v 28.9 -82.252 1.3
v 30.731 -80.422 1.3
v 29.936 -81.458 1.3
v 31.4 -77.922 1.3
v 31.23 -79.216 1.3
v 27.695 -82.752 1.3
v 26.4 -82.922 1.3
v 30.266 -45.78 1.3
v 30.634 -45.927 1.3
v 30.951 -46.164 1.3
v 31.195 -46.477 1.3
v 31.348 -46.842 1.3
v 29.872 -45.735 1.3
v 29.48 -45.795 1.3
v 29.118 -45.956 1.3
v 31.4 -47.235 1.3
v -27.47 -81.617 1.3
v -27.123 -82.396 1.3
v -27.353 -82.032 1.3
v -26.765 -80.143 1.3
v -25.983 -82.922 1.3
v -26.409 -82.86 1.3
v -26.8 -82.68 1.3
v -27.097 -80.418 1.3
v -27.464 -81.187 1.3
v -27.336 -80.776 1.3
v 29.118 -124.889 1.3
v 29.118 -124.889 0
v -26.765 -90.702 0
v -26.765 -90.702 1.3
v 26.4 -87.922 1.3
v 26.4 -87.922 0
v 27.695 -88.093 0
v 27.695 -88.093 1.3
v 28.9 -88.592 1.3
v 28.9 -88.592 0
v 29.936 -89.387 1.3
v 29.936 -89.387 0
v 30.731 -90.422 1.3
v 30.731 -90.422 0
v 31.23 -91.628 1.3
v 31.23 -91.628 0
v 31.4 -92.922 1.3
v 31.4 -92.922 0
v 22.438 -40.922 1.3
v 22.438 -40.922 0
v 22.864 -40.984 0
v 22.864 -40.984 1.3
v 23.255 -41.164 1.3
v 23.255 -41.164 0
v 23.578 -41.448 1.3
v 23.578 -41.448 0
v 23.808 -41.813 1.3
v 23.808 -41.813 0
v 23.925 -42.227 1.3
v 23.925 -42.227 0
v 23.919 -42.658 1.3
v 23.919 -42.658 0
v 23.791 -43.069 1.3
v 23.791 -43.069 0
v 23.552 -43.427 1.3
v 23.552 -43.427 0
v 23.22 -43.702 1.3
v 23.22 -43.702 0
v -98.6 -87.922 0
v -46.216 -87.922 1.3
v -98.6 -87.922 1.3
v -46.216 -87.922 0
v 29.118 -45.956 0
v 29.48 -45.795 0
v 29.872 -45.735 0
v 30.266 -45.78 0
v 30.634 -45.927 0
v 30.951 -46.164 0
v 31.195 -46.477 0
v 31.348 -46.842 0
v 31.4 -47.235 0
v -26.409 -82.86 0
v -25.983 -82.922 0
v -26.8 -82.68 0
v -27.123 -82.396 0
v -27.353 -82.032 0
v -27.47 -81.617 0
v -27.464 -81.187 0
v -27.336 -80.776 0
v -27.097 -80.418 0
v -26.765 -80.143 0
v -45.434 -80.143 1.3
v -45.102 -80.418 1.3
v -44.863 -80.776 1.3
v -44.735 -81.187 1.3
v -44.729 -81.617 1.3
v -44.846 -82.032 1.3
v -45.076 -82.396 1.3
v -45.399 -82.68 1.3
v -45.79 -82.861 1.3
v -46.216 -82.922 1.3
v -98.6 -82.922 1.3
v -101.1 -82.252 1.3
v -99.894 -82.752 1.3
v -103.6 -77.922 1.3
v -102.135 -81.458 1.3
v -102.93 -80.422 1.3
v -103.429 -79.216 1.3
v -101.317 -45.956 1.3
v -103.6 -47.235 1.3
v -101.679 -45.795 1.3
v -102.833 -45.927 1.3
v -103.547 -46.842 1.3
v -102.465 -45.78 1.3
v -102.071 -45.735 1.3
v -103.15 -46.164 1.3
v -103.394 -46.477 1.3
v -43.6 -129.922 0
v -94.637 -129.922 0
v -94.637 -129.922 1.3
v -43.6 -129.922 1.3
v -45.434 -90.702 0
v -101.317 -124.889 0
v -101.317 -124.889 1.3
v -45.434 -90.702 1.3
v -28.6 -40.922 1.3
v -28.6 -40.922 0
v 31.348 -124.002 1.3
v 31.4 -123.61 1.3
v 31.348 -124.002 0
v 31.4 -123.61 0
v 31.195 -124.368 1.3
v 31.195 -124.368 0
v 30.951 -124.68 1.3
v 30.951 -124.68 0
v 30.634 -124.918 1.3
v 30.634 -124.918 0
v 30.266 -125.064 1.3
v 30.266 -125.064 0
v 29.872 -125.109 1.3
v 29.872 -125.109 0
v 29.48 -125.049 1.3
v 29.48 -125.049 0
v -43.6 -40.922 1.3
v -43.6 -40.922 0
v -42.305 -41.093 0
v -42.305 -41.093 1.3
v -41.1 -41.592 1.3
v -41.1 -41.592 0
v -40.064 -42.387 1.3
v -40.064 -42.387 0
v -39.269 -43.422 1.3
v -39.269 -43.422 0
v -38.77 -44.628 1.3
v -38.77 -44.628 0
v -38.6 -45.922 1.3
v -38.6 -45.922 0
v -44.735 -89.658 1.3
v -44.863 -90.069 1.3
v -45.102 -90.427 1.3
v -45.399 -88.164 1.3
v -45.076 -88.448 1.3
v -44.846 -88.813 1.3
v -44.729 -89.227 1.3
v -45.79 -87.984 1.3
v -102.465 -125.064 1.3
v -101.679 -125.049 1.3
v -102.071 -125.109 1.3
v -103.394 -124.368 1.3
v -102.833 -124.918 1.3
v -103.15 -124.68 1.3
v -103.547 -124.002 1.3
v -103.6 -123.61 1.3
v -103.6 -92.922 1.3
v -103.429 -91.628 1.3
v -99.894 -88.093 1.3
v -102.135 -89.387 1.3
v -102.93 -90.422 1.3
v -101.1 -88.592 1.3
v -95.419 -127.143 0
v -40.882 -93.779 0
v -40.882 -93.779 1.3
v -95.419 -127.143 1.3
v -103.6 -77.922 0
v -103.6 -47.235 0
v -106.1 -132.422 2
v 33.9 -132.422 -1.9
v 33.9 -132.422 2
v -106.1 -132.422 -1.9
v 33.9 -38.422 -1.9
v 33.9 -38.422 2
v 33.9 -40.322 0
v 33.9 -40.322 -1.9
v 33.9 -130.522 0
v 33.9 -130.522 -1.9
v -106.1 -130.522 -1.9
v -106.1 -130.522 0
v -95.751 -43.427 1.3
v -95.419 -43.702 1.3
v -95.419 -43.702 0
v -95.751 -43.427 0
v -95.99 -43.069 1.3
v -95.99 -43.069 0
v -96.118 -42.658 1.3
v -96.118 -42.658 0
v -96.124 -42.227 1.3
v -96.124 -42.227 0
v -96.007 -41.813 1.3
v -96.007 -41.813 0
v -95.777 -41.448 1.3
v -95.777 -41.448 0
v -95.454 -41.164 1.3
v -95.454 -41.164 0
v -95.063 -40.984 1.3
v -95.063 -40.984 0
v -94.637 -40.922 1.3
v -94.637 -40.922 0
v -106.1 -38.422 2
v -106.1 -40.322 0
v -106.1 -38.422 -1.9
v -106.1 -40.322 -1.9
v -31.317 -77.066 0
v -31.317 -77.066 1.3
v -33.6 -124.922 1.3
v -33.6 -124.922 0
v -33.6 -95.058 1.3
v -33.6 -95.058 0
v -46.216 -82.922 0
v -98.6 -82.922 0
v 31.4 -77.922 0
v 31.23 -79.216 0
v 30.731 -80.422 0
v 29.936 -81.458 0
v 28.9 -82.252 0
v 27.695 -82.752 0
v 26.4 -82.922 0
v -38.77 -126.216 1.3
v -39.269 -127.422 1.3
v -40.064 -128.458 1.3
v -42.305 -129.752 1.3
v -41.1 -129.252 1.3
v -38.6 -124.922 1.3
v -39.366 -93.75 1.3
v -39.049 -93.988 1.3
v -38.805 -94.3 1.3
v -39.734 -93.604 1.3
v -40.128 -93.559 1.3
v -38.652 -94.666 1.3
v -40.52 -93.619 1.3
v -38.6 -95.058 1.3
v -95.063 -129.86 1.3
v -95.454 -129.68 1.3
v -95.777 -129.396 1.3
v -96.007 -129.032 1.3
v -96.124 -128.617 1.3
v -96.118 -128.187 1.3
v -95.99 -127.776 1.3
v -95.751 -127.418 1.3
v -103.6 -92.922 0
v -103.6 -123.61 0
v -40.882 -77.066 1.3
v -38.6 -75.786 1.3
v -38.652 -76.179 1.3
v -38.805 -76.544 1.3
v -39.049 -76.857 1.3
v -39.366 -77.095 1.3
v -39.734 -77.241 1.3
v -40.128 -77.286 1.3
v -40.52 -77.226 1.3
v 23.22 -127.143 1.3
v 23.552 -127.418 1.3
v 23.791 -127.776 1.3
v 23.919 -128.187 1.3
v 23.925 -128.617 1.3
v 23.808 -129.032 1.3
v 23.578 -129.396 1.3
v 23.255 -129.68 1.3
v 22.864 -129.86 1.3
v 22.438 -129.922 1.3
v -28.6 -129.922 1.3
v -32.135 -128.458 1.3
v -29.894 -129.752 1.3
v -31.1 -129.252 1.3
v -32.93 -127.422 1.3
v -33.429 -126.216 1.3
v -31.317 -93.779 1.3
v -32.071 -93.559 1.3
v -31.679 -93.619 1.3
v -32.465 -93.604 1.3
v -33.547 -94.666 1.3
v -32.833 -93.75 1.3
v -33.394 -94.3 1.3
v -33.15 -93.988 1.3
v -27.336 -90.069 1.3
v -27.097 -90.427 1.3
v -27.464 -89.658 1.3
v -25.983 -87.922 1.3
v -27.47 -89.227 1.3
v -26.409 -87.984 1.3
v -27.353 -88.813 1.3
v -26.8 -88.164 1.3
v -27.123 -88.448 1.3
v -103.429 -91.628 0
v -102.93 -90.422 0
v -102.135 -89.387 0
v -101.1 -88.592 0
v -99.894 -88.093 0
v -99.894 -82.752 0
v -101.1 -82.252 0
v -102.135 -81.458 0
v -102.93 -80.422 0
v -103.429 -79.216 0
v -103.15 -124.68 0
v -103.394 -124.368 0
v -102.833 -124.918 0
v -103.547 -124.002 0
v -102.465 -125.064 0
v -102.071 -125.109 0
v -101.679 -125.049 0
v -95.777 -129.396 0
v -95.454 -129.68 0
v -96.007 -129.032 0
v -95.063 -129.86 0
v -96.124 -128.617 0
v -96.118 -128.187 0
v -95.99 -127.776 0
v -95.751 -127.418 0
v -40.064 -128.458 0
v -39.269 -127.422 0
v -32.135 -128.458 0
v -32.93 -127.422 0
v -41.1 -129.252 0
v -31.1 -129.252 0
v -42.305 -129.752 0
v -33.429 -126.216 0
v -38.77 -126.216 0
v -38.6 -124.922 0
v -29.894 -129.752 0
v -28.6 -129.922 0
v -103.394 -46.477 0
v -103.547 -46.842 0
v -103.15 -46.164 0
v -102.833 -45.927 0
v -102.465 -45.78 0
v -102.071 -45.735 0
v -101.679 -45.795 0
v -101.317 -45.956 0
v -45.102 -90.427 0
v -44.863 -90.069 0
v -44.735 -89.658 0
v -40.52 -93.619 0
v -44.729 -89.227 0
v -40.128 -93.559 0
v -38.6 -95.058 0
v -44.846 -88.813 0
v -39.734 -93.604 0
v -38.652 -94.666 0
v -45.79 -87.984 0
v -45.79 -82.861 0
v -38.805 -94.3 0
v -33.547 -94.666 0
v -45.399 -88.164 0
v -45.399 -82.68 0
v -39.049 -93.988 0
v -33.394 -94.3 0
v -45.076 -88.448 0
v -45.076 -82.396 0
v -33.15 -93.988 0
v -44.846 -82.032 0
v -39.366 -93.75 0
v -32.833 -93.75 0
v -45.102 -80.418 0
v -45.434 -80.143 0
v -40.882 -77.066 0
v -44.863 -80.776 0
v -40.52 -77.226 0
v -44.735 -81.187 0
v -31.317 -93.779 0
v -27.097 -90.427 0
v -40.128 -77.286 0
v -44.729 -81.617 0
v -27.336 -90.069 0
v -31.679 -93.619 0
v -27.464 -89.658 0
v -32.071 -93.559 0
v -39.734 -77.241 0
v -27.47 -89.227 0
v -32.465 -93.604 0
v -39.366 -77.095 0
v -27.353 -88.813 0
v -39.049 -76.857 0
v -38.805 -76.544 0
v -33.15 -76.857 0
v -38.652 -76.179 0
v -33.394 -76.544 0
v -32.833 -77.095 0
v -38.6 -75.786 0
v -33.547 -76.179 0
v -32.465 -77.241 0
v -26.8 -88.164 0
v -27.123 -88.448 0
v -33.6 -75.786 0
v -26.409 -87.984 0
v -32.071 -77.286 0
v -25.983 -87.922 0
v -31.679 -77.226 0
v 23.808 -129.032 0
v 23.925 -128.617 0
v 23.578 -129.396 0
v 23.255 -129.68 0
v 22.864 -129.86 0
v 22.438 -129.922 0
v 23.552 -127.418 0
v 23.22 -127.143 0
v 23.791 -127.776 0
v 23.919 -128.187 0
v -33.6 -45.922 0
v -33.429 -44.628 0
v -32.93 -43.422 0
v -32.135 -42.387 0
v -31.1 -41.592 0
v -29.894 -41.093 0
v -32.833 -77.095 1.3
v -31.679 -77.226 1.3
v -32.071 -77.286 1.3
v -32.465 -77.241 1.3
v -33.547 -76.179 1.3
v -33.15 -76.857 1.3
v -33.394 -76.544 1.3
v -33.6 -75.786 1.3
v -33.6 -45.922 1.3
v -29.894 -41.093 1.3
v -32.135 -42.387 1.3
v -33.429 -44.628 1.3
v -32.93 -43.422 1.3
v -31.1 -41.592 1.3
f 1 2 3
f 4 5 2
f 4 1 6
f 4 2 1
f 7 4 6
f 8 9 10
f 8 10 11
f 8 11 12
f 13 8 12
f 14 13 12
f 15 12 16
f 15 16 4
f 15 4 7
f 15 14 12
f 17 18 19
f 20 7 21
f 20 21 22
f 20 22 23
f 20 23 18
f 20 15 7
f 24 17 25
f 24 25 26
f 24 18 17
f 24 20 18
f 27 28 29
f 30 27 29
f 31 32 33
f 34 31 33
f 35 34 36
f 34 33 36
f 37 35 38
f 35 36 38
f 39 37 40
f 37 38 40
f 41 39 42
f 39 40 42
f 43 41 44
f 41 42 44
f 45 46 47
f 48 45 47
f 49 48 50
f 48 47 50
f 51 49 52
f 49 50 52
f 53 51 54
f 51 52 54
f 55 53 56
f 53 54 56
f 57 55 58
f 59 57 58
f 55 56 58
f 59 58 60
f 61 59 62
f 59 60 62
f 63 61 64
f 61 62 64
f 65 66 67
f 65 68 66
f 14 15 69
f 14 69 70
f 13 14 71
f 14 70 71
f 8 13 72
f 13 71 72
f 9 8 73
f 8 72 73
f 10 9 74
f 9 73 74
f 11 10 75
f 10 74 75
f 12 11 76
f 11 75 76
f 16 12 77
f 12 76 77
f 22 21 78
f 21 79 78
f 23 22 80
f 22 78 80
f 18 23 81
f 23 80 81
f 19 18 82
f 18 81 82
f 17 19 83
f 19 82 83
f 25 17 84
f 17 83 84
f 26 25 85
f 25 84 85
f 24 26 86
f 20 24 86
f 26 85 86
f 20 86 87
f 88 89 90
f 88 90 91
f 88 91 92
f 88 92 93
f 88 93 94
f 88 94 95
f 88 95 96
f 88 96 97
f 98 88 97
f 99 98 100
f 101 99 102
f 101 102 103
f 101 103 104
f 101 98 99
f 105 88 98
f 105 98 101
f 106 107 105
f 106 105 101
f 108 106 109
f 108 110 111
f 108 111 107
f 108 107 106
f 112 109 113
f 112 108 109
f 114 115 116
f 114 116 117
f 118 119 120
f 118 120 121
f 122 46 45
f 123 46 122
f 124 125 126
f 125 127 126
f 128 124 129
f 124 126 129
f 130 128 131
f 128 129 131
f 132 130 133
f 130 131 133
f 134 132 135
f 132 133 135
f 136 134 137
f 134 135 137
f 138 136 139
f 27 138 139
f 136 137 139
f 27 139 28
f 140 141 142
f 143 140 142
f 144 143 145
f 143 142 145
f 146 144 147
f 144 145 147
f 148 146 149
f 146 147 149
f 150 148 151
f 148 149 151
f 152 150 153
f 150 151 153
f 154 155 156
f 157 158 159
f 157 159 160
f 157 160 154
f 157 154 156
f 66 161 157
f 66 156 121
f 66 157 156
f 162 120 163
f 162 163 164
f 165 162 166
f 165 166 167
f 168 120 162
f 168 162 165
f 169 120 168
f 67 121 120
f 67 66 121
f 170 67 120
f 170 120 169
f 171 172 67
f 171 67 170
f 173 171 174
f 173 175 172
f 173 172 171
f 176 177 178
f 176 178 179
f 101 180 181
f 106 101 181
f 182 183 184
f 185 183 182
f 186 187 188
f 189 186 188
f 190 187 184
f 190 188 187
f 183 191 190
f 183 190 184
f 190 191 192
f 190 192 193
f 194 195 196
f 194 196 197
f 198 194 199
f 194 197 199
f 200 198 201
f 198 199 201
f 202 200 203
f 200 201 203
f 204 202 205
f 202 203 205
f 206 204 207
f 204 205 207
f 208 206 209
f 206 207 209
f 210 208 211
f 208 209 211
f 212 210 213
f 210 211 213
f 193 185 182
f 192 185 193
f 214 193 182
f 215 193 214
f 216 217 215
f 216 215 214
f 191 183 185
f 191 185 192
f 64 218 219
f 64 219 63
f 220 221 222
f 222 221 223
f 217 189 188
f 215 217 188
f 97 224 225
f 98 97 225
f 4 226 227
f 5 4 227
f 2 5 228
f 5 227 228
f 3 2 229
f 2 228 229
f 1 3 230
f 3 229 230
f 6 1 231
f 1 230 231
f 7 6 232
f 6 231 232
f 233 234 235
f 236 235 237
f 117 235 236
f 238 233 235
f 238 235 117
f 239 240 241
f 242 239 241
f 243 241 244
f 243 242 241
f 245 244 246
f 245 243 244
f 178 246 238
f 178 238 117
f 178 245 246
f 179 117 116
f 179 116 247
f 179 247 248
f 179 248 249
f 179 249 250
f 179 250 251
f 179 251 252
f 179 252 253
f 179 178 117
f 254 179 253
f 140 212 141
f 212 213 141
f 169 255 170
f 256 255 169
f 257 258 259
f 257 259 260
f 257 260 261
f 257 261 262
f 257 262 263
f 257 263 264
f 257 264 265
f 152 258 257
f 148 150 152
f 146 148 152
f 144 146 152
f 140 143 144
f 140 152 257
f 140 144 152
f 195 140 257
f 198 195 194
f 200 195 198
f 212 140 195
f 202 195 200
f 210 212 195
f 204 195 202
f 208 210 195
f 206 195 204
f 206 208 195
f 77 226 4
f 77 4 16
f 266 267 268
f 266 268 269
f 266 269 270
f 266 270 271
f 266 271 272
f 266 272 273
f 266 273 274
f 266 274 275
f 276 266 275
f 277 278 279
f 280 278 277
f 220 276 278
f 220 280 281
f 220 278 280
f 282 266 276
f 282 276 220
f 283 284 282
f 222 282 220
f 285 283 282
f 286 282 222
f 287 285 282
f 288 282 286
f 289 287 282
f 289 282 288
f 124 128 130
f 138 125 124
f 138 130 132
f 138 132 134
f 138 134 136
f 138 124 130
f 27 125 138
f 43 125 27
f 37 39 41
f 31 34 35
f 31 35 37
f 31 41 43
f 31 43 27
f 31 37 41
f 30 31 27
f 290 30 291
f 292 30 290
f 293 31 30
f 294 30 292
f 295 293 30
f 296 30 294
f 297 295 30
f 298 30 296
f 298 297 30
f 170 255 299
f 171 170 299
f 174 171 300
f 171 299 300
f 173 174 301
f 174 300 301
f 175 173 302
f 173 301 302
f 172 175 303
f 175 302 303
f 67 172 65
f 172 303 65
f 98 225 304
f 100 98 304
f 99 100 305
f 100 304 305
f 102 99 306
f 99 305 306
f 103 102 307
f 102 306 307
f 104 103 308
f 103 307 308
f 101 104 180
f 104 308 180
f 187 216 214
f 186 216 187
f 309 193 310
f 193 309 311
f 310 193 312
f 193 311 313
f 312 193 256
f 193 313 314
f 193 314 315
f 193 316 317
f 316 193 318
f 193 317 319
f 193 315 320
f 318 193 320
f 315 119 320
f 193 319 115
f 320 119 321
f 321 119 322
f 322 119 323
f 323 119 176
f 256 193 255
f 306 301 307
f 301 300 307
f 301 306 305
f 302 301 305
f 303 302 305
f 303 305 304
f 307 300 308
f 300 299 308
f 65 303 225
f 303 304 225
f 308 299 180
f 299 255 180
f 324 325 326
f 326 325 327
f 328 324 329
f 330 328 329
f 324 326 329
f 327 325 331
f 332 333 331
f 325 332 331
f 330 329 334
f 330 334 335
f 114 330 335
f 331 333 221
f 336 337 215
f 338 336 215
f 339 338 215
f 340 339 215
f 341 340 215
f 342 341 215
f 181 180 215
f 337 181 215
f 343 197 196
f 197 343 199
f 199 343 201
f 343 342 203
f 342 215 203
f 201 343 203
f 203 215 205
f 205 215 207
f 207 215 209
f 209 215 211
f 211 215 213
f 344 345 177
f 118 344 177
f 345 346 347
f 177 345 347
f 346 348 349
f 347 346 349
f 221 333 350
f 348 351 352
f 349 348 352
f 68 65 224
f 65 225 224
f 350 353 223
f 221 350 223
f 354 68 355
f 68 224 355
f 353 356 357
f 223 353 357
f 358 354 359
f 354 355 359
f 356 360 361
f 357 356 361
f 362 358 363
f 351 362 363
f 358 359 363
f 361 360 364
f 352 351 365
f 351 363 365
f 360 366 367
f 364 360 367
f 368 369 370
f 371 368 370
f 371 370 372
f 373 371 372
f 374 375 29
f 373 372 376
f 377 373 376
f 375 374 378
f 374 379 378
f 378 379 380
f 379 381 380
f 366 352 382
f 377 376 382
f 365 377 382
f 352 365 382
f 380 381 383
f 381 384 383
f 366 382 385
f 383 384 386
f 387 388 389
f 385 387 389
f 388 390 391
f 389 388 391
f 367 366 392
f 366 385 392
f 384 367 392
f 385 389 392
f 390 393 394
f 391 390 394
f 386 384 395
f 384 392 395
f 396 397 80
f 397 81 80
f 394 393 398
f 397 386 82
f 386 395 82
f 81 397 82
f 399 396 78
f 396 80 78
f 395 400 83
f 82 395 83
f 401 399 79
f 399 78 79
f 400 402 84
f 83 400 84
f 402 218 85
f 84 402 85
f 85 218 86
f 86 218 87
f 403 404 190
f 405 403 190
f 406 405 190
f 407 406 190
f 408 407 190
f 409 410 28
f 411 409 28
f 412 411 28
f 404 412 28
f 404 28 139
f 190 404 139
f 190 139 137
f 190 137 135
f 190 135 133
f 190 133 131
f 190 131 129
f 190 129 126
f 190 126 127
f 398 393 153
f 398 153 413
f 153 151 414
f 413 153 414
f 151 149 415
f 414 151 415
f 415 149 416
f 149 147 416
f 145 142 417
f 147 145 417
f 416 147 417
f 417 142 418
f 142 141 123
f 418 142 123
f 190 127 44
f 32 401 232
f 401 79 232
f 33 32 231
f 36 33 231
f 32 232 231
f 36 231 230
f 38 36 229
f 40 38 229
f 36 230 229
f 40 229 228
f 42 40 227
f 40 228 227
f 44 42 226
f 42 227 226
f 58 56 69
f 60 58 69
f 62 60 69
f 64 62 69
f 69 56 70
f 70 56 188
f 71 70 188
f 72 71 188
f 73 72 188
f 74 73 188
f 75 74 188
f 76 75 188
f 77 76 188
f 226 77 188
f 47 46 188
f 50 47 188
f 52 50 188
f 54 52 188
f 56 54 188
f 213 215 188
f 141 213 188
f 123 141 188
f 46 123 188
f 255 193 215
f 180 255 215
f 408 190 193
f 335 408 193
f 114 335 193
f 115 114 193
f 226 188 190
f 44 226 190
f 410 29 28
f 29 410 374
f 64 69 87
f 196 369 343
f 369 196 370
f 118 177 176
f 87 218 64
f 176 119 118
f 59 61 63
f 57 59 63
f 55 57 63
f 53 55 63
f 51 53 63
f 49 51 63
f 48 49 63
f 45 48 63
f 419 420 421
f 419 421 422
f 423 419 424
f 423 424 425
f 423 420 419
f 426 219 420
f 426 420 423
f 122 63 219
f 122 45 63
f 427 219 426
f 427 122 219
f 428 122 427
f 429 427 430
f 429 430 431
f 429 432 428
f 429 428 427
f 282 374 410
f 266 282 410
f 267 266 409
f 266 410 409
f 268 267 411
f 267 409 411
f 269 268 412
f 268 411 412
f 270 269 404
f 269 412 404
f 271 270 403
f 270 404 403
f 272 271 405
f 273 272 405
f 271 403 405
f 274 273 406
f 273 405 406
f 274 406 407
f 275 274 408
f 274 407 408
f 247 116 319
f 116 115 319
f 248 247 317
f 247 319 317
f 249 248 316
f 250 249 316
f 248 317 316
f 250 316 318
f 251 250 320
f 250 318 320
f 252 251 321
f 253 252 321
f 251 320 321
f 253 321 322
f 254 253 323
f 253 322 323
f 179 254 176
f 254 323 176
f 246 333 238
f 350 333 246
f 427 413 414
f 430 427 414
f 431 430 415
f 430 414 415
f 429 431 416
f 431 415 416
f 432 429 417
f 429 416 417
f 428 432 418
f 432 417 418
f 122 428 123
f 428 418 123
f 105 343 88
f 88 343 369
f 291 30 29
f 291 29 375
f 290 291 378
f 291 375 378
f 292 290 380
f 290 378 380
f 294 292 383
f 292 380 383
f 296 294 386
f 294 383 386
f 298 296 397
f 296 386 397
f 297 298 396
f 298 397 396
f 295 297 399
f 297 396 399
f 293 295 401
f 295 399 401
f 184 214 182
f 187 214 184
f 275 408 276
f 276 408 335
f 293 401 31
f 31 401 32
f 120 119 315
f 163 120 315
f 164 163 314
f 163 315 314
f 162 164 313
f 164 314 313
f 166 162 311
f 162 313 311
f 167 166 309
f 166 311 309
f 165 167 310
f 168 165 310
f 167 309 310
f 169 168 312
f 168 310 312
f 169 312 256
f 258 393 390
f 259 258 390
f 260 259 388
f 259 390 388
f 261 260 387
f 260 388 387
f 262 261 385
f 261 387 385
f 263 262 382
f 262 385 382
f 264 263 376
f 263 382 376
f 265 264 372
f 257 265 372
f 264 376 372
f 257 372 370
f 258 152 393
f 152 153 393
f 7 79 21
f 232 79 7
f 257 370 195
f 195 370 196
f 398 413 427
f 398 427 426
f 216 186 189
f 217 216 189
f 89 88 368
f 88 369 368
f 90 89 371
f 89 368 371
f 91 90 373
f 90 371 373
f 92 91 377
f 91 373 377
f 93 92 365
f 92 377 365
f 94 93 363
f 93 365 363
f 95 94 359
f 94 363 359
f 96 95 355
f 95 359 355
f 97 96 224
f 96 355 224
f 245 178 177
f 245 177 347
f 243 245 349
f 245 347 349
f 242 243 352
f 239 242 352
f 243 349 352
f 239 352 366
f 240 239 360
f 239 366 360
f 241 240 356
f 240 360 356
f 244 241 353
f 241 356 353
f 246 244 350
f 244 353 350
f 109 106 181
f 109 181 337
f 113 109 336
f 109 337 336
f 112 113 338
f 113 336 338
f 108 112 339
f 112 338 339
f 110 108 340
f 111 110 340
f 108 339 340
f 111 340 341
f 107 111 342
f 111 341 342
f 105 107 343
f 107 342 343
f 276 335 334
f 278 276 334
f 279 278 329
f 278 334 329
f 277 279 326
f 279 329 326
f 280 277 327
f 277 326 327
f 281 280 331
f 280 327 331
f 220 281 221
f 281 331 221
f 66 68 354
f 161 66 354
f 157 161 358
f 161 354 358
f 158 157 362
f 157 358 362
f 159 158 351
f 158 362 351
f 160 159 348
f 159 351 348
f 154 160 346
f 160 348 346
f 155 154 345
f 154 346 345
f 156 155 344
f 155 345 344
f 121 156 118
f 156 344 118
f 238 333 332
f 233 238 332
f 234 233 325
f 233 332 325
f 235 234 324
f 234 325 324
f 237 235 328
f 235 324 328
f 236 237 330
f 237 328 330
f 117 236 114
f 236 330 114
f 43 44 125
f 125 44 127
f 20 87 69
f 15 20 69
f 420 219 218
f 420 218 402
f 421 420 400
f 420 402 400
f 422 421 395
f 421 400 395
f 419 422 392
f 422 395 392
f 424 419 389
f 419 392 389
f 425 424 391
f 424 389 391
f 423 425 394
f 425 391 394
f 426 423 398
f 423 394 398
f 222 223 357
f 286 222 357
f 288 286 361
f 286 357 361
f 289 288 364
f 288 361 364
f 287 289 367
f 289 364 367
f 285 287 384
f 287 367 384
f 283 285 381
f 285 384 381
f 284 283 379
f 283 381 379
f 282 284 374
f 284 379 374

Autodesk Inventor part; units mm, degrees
ref_plane "YZ Plane" through (0, 0, 0) normal (1, 0, 0) x (0, 1, 0)
ref_plane "XZ Plane" through (0, 0, 0) normal (0, 1, 0) x (-1, 0, 0)
ref_plane "XY Plane" through (0, 0, 0) normal (0, 0, 1) x (1, 0, 0)
sketch "PanelBody" plane through (0, 0, 0) normal (0, 0, 1) x (1, 0, 0)
  line L0 (-106.0995, -38.4223) -> (33.9005, -38.4223)
  line L1 (33.9005, -38.4223) -> (33.9005, -132.4223)
  line L2 (33.9005, -132.4223) -> (-106.0995, -132.4223)
  line L3 (-106.0995, -132.4223) -> (-106.0995, -38.4223)
  dimension "d1" = 140
  dimension "d2" = 94
extrude "PanelFace" add sketch "PanelBody" along normal blind 2
sketch "SideHooks" plane through (-106.0995, -132.4223, 0) normal (-1, 0, 0) x (0, 0, 1)
  line L0 (0, 94) -> (-1.9, 94)
  line L1 (-1.9, 94) -> (-1.9, 92.1)
  line L2 (-1.9, 92.1) -> (0, 92.1)
  line L3 (0, 92.1) -> (0, 94)
  line L4 (0, 0) -> (-1.9, 0)
  line L5 (-1.9, 0) -> (-1.9, 1.9)
  line L6 (-1.9, 1.9) -> (0, 1.9)
  line L7 (0, 1.9) -> (0, 0)
  point P0 (0, 132.4223)
  dimension "d33" = 1.9
extrude "Corners" add sketch "SideHooks" against normal blind 140
sketch "Sketch3" plane through (33.9005, -38.4223, -1.9) normal (0, 0, -1) x (-1, 0, 0)
  line L0 (0, -94) -> (140, -94) construction
  line L1 (140, -94) -> (140, 0) construction
  line L2 (140, 0) -> (0, 0) construction
  line L3 (0, 0) -> (0, -94) construction
  line L4 (137.5, -91.5) -> (133.8633, -91.5) construction
  line L5 (72.5, -86.5) -> (72.5, -56.6362)
  line L6 (137.5, -54.5) -> (137.5, -85.1873)
  line L7 (137.5, -2.5) -> (133.8633, -2.5) construction
  line L8 (72.5, -7.5) -> (72.5, -37.3638)
  line L9 (137.5, -39.5) -> (137.5, -8.8127)
  line L10 (2.5, -2.5) -> (6.1367, -2.5) construction
  line L11 (67.5, -7.5) -> (67.5, -37.3638)
  line L12 (2.5, -39.5) -> (2.5, -8.8127)
  line L13 (2.5, -91.5) -> (6.1367, -91.5) construction
  line L14 (67.5, -86.5) -> (67.5, -56.6362)
  line L15 (2.5, -54.5) -> (2.5, -85.1873)
  line L16 (72.5, -2.5) -> (67.5, -2.5) construction
  line L17 (2.5, -44.5) -> (2.5, -49.5) construction
  line L18 (67.5, -91.5) -> (72.5, -91.5) construction
  line L19 (137.5, -44.5) -> (137.5, -49.5) construction
  line L20 (135.2172, -7.5332) -> (79.3341, -41.7204)
  line L21 (74.7828, -38.6434) -> (129.3198, -5.2796)
  line L22 (65.2172, -38.6434) -> (10.6802, -5.2796)
  line L23 (60.6659, -41.7204) -> (4.7828, -7.5332)
  line L24 (11.4629, -2.5) -> (62.5, -2.5)
  line L25 (2.5, -6.1367) -> (2.5, -2.5) construction
  line L26 (80.1169, -44.5) -> (132.5, -44.5)
  line L27 (137.5, -6.1367) -> (137.5, -2.5) construction
  line L28 (128.5371, -2.5) -> (77.5, -2.5)
  line L29 (59.8831, -44.5) -> (7.5, -44.5)
  line L30 (135.2172, -86.4668) -> (79.3341, -52.2796)
  line L31 (74.7828, -55.3566) -> (129.3198, -88.7204)
  line L32 (65.2172, -55.3566) -> (10.6802, -88.7204)
  line L33 (4.7828, -86.4668) -> (60.6659, -52.2796)
  line L34 (80.1169, -49.5) -> (132.5, -49.5)
  line L35 (59.8831, -49.5) -> (7.5, -49.5)
  line L36 (2.5, -87.8633) -> (2.5, -91.5) construction
  line L37 (11.4629, -91.5) -> (62.5, -91.5)
  line L38 (128.5371, -91.5) -> (77.5, -91.5)
  line L39 (137.5, -87.8633) -> (137.5, -91.5) construction
  line L40 (140, -94) -> (0, -94) projected
  line L41 (140, 0) -> (0, 0) projected
  line L42 (0, -1.9) -> (0, -92.1) projected
  line L43 (140, 0) -> (140, -1.9) projected
  line L44 (103.0028, -27.2408) -> (100.3935, -22.9756) construction
  line L45 (91.7427, -59.8707) -> (89.1334, -64.1358) construction
  line L46 (57.5593, -60.0415) -> (54.95, -55.7763) construction
  line L47 (48.3721, -34.1995) -> (50.9813, -29.9344) construction
  line L48 (74.7906, -49.5) -> (65.2094, -49.5) construction
  line L49 (65.2094, -44.5) -> (74.7906, -44.5) construction
  line L50 (72.5, -53.9601) -> (72.5, -40.0399) construction
  line L51 (67.5, -53.9601) -> (67.5, -40.0399) construction
  arc A0 (77.5, -2.5) -> (72.5, -7.5) centre (77.5, -7.5) ccw
  arc A1 (67.5, -7.5) -> (62.5, -2.5) centre (62.5, -7.5) ccw
  arc A2 (72.5, -86.5) -> (77.5, -91.5) centre (77.5, -86.5) ccw
  arc A3 (62.5, -91.5) -> (67.5, -86.5) centre (62.5, -86.5) ccw
  arc A4 (2.5, -39.5) -> (7.5, -44.5) centre (7.5, -39.5) ccw
  arc A5 (7.5, -49.5) -> (2.5, -54.5) centre (7.5, -54.5) ccw
  arc A6 (137.5, -54.5) -> (132.5, -49.5) centre (132.5, -54.5) ccw
  arc A7 (132.5, -44.5) -> (137.5, -39.5) centre (132.5, -39.5) ccw
  arc A8 (80.1169, -49.5) -> (79.3341, -52.2796) centre (80.1169, -51) ccw
  arc A9 (74.7828, -55.3566) -> (72.5, -56.6362) centre (74, -56.6362) ccw
  arc A10 (67.5, -56.6362) -> (65.2172, -55.3566) centre (66, -56.6362) ccw
  arc A11 (60.6659, -52.2796) -> (59.8831, -49.5) centre (59.8831, -51) ccw
  arc A12 (59.8831, -44.5) -> (60.6659, -41.7204) centre (59.8831, -43) ccw
  arc A13 (65.2172, -38.6434) -> (67.5, -37.3638) centre (66, -37.3638) ccw
  arc A14 (72.5, -37.3638) -> (74.7828, -38.6434) centre (74, -37.3638) ccw
  arc A15 (79.3341, -41.7204) -> (80.1169, -44.5) centre (80.1169, -43) ccw
  arc A16 (137.5, -8.8127) -> (135.2172, -7.5332) centre (136, -8.8127) ccw
  arc A17 (129.3198, -5.2796) -> (128.5371, -2.5) centre (128.5371, -4) ccw
  arc A18 (11.4629, -2.5) -> (10.6802, -5.2796) centre (11.4629, -4) ccw
  arc A19 (4.7828, -7.5332) -> (2.5, -8.8127) centre (4, -8.8127) ccw
  arc A20 (2.5, -85.1873) -> (4.7828, -86.4668) centre (4, -85.1873) ccw
  arc A21 (10.6802, -88.7204) -> (11.4629, -91.5) centre (11.4629, -90) ccw
  arc A22 (128.5371, -91.5) -> (129.3198, -88.7204) centre (128.5371, -90) ccw
  arc A23 (135.2172, -86.4668) -> (137.5, -85.1873) centre (136, -85.1873) ccw
  dimension "d16" = 2.5
  dimension "d24" = 5
  dimension "d25" = 5
  dimension "d26" = 2.5
  dimension "d27" = 2.5
  dimension "d28" = 2.5
  dimension "d34" = 0
  dimension "d36" = 0
  dimension "d37" = 0
  dimension "d38" = 0
  dimension "d39" = 5
  dimension "d40" = 5
  dimension "d41" = 1.5
extrude "ReinforcementBars" cut sketch "Sketch3" against normal blind 3.2
sketch "Sketch4" plane through (0, 0, 2) normal (0, 0, 1) x (1, 0, 0)
  line L0 (-62.4757, -113.2868) -> (-62.4757, -58.6034) construction
  line L1 (-62.4757, -58.6034) -> (1.9126, -58.6034) construction
  line L2 (1.9126, -58.6034) -> (1.9126, -113.2868) construction
  line L3 (1.9126, -113.2868) -> (-62.4757, -113.2868) construction
  point P0 (0, 0)
extrude "Extrusion4" [suppressed]
properties part number "SidePanelNarrow" material "Nylon 6"
